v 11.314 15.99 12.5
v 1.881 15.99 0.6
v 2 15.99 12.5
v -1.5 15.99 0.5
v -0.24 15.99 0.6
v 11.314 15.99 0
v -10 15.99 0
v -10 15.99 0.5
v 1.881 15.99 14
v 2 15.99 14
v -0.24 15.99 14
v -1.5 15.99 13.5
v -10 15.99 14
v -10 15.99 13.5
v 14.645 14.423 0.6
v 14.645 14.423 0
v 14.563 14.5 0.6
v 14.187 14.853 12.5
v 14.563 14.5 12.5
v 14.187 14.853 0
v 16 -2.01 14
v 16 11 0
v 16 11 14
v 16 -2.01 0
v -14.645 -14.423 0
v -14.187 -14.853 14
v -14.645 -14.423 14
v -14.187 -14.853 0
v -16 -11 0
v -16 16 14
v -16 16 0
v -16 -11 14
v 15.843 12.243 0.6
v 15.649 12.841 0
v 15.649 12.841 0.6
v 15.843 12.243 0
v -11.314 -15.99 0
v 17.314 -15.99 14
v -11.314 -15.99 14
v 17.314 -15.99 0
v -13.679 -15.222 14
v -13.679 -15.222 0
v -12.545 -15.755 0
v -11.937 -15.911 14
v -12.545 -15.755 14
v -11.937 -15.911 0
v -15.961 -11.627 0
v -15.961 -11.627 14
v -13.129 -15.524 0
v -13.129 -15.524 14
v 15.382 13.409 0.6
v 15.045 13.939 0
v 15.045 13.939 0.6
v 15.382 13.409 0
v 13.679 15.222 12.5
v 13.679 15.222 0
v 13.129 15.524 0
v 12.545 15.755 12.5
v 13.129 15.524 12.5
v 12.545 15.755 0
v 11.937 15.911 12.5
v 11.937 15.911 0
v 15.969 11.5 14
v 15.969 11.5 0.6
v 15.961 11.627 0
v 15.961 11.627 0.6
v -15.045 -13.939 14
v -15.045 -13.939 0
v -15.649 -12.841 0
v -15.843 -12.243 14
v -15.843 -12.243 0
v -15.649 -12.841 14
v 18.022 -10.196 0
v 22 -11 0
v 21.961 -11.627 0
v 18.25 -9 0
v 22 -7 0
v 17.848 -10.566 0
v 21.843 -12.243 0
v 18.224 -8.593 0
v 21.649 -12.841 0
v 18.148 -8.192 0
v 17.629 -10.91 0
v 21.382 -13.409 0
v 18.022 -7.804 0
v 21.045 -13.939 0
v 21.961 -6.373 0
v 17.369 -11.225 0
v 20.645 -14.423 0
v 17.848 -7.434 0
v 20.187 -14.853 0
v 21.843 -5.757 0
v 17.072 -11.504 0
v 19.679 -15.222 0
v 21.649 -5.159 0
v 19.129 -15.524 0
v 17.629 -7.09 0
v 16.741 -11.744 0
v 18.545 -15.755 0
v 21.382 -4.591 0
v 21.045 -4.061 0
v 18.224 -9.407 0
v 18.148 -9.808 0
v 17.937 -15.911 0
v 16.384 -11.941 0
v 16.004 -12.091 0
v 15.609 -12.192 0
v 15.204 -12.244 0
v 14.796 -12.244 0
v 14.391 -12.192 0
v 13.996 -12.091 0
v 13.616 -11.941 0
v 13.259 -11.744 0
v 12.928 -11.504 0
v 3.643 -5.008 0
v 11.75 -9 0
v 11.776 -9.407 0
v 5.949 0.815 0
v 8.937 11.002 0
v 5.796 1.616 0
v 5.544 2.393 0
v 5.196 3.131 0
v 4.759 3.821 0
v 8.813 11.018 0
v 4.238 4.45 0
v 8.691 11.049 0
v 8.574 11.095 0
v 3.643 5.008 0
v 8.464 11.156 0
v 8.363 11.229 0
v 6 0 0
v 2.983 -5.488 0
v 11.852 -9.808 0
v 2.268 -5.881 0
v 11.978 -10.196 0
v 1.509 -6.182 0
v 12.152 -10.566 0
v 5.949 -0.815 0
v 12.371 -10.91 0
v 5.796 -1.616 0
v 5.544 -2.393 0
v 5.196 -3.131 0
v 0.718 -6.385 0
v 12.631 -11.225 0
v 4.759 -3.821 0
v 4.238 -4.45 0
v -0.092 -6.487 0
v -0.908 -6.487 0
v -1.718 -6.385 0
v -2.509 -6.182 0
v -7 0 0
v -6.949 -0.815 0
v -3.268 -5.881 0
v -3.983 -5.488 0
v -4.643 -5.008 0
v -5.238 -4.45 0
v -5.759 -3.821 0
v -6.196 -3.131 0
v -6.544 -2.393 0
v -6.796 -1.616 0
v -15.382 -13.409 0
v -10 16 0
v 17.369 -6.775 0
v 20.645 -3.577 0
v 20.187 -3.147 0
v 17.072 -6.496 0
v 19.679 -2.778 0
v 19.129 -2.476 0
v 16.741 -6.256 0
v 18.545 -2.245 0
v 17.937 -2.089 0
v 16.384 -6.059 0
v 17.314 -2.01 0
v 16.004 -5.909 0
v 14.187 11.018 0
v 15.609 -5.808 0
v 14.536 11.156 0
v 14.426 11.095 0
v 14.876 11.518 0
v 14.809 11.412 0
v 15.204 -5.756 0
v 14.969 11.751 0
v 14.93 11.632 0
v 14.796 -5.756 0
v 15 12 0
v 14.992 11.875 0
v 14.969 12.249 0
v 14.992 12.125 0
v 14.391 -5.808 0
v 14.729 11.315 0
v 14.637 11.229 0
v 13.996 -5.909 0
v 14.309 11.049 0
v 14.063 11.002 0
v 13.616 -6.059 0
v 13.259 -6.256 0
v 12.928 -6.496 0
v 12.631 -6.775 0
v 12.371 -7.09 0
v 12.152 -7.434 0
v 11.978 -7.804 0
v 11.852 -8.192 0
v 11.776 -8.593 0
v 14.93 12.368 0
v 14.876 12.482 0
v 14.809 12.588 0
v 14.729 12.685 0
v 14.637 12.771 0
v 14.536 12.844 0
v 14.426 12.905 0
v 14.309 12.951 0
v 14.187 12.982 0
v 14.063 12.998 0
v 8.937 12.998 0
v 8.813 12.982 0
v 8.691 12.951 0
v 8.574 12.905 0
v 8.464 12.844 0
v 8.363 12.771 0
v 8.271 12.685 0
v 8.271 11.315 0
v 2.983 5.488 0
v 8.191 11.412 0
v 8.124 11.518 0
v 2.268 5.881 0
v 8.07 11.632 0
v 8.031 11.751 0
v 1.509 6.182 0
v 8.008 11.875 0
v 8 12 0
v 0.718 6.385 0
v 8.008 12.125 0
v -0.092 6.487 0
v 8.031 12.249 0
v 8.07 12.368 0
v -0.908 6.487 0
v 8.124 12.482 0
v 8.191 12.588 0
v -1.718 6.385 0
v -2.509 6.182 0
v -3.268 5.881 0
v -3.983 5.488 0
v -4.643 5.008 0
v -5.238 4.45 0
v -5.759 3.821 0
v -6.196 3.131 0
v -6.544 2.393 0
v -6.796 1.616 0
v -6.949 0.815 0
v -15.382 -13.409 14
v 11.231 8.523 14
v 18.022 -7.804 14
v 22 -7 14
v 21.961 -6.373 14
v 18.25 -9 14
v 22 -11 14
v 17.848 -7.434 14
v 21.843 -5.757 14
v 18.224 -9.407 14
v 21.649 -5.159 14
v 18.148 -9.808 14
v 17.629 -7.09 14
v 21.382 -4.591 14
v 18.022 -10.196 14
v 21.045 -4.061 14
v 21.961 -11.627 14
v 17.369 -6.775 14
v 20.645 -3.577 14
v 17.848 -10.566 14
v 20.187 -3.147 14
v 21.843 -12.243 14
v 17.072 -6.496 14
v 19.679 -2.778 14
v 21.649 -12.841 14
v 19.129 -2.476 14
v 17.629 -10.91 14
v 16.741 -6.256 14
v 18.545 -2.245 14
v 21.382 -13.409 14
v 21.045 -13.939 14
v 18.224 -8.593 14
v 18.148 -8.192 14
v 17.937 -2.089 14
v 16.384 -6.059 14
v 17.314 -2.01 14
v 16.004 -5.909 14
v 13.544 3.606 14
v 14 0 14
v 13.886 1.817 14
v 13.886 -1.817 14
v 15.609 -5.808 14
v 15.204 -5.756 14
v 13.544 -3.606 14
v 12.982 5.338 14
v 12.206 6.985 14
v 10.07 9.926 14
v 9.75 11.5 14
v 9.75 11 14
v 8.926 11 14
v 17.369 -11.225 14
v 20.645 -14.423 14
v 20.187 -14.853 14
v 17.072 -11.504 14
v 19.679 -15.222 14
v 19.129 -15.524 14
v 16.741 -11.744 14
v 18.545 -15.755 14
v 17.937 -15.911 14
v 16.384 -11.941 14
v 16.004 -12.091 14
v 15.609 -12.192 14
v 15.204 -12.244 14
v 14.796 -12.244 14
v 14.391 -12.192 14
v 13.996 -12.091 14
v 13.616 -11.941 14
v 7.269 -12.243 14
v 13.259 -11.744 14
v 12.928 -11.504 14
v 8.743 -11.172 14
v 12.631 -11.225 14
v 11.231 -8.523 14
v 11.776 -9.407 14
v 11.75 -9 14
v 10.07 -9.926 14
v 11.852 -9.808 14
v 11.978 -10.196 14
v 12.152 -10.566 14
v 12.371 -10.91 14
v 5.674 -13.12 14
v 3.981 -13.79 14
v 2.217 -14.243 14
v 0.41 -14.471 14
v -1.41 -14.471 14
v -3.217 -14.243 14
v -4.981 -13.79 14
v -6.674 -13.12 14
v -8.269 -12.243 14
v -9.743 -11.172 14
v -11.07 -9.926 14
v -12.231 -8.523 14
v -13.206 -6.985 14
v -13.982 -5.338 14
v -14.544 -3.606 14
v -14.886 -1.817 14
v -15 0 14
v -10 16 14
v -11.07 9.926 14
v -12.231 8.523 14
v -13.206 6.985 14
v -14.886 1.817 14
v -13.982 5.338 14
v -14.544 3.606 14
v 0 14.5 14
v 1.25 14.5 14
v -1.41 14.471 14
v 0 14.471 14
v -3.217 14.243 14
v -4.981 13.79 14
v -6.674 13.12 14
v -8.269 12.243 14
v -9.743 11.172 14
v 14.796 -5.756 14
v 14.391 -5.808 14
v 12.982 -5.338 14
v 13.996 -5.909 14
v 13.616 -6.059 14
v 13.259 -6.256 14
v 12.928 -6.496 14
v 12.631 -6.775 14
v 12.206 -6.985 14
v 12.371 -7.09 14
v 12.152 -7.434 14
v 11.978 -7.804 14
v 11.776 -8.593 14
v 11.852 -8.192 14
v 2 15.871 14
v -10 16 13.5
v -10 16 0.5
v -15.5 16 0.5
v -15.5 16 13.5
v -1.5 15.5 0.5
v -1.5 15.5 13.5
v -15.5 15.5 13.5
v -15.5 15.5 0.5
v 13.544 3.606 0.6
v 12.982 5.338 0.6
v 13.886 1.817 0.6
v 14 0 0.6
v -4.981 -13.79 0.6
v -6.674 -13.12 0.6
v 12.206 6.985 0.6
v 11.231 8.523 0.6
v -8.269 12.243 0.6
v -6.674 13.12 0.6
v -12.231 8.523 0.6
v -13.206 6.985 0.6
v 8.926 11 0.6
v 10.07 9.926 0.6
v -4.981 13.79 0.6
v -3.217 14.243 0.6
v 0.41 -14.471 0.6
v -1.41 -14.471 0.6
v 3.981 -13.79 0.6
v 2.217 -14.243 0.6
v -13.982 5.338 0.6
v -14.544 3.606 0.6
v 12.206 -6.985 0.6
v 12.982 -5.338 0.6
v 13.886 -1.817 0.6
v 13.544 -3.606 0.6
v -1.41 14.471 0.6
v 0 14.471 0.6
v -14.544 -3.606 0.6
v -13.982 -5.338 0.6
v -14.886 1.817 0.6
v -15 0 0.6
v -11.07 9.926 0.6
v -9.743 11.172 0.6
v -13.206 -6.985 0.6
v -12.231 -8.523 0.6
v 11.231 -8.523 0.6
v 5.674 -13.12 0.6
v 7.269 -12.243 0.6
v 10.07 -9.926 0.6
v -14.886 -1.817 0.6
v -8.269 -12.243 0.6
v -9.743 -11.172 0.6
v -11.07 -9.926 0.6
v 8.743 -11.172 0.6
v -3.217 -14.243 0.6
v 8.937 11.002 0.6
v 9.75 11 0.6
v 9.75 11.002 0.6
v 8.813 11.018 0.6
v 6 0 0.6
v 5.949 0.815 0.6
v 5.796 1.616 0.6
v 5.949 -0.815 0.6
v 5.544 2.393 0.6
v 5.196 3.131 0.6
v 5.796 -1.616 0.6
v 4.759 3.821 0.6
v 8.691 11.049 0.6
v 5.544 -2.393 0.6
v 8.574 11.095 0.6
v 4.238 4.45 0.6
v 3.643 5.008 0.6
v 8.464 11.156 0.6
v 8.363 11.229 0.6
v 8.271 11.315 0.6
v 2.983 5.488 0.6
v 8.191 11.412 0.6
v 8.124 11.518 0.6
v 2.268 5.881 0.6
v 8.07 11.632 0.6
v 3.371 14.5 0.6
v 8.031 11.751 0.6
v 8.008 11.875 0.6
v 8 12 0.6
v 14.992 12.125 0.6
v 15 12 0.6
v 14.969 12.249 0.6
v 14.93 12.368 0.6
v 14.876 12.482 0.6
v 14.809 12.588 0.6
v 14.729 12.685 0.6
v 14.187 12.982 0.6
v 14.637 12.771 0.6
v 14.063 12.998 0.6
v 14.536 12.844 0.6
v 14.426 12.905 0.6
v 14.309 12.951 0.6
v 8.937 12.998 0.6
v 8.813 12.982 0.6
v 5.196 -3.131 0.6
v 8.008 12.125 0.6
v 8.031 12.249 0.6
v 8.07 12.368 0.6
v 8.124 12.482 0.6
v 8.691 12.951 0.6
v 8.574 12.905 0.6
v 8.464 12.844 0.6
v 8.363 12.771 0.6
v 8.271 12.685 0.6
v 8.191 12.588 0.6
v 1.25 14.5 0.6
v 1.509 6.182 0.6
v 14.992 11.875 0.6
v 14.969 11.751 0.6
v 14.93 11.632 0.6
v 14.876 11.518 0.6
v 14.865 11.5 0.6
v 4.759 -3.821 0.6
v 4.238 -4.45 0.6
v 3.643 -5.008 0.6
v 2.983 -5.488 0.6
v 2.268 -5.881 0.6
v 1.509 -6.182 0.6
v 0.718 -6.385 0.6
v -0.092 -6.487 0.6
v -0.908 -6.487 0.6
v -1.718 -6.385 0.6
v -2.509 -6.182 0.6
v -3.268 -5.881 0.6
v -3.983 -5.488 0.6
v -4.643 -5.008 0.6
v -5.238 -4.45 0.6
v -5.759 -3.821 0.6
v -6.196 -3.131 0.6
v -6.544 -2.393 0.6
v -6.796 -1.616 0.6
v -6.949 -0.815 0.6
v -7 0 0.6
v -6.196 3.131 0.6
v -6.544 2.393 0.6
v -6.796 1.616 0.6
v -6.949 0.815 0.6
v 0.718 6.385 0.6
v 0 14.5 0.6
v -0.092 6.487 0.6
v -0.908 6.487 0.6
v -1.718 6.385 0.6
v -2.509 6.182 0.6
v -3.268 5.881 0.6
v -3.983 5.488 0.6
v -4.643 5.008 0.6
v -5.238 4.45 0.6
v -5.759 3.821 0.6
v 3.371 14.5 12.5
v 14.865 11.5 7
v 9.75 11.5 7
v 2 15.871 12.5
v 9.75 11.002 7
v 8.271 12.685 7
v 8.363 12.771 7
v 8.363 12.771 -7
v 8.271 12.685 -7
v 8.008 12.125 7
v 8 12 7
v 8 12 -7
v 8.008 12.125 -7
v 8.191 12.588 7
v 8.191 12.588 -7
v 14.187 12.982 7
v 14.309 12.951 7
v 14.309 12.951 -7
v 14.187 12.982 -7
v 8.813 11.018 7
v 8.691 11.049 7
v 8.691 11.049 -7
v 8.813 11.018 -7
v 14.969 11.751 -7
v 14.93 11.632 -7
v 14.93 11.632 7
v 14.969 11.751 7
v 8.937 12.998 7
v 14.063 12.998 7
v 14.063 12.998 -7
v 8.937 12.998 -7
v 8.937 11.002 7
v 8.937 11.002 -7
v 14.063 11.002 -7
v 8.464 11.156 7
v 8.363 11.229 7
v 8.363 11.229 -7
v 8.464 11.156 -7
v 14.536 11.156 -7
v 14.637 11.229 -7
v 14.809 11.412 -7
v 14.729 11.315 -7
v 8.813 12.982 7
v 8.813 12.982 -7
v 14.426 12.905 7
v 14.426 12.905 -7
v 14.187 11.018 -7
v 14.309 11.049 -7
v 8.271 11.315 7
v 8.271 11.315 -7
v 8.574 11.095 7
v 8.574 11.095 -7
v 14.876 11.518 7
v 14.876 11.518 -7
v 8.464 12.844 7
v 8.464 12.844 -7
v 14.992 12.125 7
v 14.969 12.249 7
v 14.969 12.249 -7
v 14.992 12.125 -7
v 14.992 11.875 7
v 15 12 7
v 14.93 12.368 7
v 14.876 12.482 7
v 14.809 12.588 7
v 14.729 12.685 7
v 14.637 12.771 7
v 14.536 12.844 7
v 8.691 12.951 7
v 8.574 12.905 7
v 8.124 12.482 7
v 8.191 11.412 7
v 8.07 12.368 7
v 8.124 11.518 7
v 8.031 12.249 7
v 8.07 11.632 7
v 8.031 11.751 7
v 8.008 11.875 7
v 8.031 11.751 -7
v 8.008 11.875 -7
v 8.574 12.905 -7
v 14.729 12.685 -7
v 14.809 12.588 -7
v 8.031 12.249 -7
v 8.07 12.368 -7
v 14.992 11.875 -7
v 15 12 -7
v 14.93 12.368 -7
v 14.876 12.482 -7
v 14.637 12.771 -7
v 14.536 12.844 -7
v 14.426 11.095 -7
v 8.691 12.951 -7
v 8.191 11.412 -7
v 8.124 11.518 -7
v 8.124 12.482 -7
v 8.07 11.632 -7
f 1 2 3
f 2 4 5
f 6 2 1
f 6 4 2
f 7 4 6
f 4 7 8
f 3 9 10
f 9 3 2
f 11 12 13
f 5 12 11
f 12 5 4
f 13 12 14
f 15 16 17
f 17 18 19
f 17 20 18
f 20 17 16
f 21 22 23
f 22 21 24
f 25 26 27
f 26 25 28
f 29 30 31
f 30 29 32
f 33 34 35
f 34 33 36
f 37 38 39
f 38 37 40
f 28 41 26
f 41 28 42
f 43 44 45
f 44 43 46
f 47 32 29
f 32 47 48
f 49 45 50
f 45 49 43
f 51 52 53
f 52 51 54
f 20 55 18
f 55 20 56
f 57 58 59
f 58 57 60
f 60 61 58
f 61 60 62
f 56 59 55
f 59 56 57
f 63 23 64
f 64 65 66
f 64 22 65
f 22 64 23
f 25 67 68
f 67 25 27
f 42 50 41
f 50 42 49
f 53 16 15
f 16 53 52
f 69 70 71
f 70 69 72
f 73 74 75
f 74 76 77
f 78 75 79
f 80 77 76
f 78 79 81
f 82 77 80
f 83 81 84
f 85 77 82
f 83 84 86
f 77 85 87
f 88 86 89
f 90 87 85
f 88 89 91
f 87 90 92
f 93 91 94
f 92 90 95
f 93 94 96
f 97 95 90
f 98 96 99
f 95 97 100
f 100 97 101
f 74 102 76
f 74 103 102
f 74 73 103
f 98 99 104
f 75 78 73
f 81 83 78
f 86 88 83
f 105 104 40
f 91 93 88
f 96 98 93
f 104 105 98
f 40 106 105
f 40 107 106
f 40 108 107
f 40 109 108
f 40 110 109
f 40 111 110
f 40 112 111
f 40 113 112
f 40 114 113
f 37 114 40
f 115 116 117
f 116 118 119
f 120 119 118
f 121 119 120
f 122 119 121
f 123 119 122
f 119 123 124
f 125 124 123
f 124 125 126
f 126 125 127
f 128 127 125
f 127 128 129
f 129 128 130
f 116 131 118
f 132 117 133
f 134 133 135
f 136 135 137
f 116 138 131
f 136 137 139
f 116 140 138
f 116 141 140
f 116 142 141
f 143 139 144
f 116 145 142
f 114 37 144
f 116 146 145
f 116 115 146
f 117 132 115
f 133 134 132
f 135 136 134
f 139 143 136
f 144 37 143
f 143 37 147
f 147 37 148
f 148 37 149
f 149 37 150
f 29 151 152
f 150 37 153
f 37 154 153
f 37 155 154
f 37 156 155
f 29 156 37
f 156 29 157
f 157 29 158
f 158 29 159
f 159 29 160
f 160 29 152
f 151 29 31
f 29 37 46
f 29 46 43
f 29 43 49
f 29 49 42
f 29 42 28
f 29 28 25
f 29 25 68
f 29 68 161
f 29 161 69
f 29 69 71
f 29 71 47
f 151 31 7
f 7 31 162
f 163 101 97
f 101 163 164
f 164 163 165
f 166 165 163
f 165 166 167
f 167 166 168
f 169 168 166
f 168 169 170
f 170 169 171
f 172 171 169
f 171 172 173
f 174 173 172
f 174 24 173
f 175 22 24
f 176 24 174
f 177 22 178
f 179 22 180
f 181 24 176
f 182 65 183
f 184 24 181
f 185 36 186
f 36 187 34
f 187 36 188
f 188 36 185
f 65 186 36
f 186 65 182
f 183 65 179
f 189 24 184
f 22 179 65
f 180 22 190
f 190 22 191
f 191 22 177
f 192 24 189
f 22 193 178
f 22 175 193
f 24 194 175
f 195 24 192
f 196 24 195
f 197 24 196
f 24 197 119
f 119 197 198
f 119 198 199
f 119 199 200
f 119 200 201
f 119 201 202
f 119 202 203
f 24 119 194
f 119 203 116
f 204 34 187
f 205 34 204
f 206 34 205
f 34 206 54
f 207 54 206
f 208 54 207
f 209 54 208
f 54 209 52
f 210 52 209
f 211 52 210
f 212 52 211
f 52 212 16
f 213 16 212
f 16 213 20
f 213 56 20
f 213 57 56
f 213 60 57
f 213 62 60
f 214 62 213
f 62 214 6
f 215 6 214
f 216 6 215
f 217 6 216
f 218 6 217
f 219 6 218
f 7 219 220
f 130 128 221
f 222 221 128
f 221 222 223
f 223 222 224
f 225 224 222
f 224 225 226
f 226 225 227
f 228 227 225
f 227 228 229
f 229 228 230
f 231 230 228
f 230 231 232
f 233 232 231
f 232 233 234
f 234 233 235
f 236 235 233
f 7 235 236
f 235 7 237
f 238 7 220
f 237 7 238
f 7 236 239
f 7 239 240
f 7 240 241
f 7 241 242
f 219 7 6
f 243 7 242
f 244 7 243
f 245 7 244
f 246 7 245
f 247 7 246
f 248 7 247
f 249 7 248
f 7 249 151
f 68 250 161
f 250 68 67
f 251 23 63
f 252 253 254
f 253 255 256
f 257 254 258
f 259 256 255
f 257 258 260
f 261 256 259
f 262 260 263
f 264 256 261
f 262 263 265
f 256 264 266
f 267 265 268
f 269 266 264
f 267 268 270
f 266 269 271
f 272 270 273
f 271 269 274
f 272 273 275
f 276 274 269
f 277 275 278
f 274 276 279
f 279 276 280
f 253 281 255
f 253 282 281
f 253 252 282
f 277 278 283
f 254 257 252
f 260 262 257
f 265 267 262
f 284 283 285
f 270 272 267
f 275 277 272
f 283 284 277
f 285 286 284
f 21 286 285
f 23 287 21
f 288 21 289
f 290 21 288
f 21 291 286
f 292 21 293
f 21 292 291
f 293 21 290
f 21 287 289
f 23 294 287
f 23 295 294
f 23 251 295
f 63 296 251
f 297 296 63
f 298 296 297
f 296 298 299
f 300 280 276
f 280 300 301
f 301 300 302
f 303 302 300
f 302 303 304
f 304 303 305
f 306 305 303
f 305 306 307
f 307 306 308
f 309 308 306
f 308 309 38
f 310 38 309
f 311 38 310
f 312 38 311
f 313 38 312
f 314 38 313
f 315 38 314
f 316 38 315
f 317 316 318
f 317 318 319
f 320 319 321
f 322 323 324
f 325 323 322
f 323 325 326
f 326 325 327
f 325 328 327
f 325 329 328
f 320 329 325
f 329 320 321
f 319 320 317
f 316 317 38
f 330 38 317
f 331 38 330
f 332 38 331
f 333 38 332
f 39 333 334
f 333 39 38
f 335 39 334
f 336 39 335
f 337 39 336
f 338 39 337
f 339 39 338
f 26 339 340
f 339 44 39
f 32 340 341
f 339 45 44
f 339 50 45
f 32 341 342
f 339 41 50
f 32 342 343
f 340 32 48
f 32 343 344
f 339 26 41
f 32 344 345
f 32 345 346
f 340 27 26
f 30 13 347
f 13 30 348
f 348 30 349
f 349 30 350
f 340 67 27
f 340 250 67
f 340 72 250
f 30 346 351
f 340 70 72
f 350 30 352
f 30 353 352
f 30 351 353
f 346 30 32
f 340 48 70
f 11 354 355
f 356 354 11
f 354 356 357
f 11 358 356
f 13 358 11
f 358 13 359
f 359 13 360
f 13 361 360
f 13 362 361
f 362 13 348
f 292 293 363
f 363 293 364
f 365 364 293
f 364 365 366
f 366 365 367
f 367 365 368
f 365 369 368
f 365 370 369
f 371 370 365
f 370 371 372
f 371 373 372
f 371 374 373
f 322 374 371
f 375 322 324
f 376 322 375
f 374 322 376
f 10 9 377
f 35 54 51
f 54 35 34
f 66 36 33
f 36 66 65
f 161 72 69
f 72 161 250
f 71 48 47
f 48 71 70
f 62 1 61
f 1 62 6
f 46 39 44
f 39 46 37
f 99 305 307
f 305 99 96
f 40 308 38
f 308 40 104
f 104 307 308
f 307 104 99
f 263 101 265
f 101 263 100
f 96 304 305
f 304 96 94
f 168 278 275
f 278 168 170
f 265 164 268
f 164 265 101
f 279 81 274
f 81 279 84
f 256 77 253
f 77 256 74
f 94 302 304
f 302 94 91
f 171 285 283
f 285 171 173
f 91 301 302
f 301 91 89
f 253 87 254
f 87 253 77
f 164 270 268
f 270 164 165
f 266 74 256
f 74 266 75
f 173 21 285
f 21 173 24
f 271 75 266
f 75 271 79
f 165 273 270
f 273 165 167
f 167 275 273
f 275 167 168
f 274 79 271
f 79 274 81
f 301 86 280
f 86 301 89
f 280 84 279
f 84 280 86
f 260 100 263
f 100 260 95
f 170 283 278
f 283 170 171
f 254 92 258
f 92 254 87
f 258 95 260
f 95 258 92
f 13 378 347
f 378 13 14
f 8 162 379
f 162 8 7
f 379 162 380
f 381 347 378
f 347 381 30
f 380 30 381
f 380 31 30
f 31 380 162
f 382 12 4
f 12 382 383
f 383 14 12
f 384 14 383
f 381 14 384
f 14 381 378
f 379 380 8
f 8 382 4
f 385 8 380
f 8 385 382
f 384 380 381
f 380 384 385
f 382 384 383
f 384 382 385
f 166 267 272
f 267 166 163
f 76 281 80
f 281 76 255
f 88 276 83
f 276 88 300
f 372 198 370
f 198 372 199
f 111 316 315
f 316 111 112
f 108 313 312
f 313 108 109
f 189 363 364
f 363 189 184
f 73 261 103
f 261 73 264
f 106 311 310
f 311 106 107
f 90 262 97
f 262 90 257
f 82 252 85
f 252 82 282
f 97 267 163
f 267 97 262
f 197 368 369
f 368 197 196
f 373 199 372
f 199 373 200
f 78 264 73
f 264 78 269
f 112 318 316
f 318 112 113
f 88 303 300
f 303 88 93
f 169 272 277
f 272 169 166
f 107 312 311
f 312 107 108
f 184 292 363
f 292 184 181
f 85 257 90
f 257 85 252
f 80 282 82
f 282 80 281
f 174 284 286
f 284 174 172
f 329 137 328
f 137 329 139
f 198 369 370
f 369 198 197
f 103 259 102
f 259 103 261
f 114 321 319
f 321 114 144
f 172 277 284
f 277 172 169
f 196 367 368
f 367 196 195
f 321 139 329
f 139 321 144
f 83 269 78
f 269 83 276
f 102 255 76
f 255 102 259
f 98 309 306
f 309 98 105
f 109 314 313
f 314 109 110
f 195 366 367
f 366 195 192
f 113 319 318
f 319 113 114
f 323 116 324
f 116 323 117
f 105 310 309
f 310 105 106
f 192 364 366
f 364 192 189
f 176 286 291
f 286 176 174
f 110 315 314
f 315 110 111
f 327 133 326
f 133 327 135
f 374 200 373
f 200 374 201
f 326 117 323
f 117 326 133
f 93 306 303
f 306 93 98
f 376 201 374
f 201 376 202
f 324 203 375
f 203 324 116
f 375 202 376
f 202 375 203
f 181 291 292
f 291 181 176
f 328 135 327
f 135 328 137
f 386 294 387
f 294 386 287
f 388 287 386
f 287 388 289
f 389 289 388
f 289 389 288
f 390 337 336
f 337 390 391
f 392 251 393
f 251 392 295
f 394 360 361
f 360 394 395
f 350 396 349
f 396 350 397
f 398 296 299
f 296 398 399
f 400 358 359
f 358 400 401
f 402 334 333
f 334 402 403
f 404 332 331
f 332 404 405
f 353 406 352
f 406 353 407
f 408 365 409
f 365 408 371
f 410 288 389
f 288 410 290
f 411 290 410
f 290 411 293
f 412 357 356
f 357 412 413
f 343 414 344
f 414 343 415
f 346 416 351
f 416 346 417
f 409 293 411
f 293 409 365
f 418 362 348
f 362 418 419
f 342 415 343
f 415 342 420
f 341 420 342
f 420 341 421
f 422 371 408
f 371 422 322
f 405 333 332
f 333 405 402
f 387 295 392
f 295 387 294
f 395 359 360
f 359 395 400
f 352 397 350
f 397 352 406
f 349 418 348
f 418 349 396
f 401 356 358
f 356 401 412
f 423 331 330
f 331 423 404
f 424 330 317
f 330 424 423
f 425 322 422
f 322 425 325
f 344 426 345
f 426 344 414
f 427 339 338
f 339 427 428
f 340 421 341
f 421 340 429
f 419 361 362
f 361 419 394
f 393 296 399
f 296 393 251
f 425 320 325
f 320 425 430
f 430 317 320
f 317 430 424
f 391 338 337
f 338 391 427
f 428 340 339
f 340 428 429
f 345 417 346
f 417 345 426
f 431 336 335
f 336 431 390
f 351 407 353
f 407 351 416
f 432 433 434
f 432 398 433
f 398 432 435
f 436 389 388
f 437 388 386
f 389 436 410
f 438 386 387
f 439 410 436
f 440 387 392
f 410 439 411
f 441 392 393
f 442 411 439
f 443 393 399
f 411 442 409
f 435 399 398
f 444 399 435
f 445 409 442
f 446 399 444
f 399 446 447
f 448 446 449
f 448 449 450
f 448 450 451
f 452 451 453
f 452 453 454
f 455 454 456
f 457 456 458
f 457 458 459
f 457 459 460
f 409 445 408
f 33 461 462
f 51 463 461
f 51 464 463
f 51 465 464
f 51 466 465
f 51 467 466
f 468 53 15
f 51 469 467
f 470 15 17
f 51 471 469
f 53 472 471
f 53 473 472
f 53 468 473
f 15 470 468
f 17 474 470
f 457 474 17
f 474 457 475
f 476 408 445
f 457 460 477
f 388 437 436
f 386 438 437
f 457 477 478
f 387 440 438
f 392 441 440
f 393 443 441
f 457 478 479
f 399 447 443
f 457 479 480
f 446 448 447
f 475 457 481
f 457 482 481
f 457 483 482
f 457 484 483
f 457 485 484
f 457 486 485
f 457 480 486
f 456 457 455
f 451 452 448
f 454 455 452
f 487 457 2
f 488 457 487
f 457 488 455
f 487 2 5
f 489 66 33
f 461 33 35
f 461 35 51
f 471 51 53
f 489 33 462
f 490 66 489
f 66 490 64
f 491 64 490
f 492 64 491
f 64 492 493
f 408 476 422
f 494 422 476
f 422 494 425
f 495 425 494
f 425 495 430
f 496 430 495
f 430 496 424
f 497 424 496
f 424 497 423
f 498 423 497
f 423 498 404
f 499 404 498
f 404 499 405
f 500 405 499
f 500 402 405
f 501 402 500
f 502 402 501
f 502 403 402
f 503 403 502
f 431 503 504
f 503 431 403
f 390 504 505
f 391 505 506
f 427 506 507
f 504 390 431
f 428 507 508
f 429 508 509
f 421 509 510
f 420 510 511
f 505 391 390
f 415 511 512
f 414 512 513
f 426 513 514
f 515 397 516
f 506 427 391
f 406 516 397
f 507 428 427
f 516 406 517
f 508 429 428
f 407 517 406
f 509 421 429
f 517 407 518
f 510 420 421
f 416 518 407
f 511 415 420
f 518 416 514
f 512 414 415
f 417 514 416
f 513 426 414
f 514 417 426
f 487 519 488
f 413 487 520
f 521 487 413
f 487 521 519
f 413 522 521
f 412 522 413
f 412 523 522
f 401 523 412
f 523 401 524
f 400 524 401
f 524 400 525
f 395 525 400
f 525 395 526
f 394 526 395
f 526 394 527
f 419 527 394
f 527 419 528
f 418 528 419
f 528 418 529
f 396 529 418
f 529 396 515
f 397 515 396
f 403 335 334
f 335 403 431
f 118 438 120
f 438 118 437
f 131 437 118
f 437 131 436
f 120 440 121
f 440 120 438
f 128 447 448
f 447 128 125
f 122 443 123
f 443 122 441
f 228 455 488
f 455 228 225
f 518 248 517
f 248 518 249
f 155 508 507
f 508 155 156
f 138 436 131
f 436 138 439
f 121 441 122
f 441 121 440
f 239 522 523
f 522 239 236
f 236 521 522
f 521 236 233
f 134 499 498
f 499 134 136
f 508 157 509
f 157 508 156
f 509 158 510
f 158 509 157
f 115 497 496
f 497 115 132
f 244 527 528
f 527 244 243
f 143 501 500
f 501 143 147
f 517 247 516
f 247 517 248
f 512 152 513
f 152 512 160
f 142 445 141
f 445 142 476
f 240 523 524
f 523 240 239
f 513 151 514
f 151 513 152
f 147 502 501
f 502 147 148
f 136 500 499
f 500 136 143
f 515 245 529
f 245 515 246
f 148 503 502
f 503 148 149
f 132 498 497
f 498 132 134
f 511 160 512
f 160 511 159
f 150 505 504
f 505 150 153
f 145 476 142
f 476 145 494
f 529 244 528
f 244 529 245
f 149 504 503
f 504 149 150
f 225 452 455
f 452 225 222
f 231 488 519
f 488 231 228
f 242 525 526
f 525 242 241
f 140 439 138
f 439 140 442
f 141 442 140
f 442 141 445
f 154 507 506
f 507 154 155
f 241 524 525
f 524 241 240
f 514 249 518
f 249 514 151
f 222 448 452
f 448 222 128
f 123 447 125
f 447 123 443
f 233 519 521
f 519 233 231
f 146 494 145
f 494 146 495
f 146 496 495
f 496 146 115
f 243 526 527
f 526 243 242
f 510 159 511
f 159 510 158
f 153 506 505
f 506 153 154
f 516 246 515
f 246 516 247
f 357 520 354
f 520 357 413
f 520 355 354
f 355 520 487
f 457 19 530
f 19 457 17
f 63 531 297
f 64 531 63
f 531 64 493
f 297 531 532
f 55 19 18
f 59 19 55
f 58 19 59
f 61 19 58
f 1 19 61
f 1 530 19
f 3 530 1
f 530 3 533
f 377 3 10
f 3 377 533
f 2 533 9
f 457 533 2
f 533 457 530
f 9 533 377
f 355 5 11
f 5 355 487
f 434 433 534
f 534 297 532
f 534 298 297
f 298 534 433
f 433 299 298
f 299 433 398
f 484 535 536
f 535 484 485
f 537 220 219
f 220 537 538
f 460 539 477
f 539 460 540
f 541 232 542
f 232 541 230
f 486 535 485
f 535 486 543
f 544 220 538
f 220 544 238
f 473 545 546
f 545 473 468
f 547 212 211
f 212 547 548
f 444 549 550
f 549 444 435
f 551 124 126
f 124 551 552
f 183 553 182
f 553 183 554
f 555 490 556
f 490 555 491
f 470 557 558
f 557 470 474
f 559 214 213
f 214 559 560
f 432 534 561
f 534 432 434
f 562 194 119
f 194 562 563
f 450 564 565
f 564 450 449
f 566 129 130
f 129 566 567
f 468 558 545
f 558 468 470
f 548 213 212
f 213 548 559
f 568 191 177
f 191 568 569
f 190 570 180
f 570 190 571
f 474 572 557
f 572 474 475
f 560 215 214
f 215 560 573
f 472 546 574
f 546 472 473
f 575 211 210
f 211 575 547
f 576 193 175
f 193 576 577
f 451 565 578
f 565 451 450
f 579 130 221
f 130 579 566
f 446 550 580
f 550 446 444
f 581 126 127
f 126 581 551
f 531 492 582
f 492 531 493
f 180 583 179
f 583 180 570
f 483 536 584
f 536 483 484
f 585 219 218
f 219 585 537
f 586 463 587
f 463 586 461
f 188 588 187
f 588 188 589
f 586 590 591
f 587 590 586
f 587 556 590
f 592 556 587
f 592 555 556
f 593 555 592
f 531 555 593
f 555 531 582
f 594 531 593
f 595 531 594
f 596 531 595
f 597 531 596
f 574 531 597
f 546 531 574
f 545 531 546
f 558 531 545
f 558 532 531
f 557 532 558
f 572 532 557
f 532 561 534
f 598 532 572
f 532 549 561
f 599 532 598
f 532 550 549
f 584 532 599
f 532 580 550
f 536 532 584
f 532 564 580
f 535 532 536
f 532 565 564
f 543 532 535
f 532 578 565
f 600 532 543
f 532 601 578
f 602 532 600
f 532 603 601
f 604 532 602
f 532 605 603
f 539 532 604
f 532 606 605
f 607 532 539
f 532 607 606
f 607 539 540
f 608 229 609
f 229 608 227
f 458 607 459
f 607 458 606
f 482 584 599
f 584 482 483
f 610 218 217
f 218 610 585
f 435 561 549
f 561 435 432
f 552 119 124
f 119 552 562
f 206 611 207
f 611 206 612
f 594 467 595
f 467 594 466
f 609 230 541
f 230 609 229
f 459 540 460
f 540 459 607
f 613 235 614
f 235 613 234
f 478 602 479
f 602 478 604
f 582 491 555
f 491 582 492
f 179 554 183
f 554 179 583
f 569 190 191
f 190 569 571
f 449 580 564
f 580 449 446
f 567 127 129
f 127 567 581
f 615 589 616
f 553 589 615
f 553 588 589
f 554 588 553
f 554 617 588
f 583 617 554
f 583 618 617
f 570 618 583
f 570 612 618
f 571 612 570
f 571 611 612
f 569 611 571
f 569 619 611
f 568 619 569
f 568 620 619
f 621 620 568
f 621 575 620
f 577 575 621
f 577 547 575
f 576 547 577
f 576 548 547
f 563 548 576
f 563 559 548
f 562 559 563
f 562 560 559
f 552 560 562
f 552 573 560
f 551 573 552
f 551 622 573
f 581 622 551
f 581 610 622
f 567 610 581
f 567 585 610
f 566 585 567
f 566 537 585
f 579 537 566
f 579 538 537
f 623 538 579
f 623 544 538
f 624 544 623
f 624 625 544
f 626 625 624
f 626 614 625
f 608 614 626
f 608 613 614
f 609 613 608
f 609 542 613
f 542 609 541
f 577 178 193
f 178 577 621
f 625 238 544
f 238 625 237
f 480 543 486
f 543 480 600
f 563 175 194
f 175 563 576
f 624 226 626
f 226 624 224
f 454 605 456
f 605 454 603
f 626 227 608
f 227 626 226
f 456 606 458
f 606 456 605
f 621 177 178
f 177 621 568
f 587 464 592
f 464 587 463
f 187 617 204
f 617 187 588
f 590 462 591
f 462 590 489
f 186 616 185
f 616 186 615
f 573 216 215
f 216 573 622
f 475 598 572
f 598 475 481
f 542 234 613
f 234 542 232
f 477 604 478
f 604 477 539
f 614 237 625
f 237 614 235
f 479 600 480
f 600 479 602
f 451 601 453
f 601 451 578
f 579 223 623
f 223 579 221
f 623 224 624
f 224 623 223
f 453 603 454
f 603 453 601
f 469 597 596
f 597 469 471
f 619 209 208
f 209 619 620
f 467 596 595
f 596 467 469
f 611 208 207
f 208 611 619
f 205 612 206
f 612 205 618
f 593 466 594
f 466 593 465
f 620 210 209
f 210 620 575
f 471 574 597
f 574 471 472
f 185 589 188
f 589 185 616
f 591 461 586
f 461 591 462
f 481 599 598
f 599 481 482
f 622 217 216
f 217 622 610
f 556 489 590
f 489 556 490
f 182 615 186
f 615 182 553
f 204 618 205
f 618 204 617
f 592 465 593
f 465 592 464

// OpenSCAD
$fn = 50;


union() {
	difference() {
		union() {
			hull() {
				translate(v = [-11.0000000000, 11.0000000000, 0]) {
					cylinder(h = 14, r = 5);
				}
				translate(v = [11.0000000000, 11.0000000000, 0]) {
					cylinder(h = 14, r = 5);
				}
				translate(v = [-11.0000000000, -11.0000000000, 0]) {
					cylinder(h = 14, r = 5);
				}
				translate(v = [11.0000000000, -11.0000000000, 0]) {
					cylinder(h = 14, r = 5);
				}
			}
			translate(v = [7.5000000000, -9.0000000000, 0]) {
				hull() {
					translate(v = [-9.5000000000, 2.0000000000, 0]) {
						cylinder(h = 14, r = 5);
					}
					translate(v = [9.5000000000, 2.0000000000, 0]) {
						cylinder(h = 14, r = 5);
					}
					translate(v = [-9.5000000000, -2.0000000000, 0]) {
						cylinder(h = 14, r = 5);
					}
					translate(v = [9.5000000000, -2.0000000000, 0]) {
						cylinder(h = 14, r = 5);
					}
				}
			}
			translate(v = [-16.0000000000, 10.0000000000, 0]) {
				cube(size = [6, 6, 14]);
			}
		}
		union() {
			translate(v = [-15.5000000000, 15.5000000000, 0.5000000000]) {
				cube(size = [14, 0.5000000000, 13.0000000000]);
			}
			translate(v = [15.0000000000, -9.0000000000, -100.0000000000]) {
				cylinder(h = 200, r = 3.2500000000);
			}
			translate(v = [-0.5000000000, 0.0000000000, 0.6000000000]) {
				cylinder(h = 16.4000000000, r = 14.5000000000);
			}
			translate(v = [-0.5000000000, 0.0000000000, -7.0000000000]) {
				cylinder(h = 14, r = 6.5000000000);
			}
			translate(v = [0.0000000000, 11.5000000000, 0.6000000000]) {
				cube(size = [16.0000000000, 3, 16.4000000000]);
			}
			translate(v = [2.0000000000, 11.5000000000, 12.5000000000]) {
				cube(size = [14.0000000000, 6, 1.5000000000]);
			}
			translate(v = [-3.0000000000, 18.7500000000, 0.6000000000]) {
				rotate(a = [0, 0, -45]) {
					cube(size = [10, 1.5000000000, 16.4000000000]);
				}
			}
			translate(v = [2.2500000000, 11.0000000000, 0.6000000000]) {
				cube(size = [7.5000000000, 2, 13.4000000000]);
			}
		}
	}
	union() {
		translate(v = [11.5000000000, 12, -7.0000000000]) {
			rotate(a = [0, 0, 0]) {
				difference() {
					union() {
						hull() {
							translate(v = [2.5000000000, 0, 0]) {
								cylinder(h = 14, r = 1.0000000000, r1 = 1.0000000000, r2 = 1.0000000000);
							}
							translate(v = [-2.5000000000, 0, 0]) {
								cylinder(h = 14, r = 1.0000000000, r1 = 1.0000000000, r2 = 1.0000000000);
							}
						}
					}
					union();
				}
			}
		}
	}
}
